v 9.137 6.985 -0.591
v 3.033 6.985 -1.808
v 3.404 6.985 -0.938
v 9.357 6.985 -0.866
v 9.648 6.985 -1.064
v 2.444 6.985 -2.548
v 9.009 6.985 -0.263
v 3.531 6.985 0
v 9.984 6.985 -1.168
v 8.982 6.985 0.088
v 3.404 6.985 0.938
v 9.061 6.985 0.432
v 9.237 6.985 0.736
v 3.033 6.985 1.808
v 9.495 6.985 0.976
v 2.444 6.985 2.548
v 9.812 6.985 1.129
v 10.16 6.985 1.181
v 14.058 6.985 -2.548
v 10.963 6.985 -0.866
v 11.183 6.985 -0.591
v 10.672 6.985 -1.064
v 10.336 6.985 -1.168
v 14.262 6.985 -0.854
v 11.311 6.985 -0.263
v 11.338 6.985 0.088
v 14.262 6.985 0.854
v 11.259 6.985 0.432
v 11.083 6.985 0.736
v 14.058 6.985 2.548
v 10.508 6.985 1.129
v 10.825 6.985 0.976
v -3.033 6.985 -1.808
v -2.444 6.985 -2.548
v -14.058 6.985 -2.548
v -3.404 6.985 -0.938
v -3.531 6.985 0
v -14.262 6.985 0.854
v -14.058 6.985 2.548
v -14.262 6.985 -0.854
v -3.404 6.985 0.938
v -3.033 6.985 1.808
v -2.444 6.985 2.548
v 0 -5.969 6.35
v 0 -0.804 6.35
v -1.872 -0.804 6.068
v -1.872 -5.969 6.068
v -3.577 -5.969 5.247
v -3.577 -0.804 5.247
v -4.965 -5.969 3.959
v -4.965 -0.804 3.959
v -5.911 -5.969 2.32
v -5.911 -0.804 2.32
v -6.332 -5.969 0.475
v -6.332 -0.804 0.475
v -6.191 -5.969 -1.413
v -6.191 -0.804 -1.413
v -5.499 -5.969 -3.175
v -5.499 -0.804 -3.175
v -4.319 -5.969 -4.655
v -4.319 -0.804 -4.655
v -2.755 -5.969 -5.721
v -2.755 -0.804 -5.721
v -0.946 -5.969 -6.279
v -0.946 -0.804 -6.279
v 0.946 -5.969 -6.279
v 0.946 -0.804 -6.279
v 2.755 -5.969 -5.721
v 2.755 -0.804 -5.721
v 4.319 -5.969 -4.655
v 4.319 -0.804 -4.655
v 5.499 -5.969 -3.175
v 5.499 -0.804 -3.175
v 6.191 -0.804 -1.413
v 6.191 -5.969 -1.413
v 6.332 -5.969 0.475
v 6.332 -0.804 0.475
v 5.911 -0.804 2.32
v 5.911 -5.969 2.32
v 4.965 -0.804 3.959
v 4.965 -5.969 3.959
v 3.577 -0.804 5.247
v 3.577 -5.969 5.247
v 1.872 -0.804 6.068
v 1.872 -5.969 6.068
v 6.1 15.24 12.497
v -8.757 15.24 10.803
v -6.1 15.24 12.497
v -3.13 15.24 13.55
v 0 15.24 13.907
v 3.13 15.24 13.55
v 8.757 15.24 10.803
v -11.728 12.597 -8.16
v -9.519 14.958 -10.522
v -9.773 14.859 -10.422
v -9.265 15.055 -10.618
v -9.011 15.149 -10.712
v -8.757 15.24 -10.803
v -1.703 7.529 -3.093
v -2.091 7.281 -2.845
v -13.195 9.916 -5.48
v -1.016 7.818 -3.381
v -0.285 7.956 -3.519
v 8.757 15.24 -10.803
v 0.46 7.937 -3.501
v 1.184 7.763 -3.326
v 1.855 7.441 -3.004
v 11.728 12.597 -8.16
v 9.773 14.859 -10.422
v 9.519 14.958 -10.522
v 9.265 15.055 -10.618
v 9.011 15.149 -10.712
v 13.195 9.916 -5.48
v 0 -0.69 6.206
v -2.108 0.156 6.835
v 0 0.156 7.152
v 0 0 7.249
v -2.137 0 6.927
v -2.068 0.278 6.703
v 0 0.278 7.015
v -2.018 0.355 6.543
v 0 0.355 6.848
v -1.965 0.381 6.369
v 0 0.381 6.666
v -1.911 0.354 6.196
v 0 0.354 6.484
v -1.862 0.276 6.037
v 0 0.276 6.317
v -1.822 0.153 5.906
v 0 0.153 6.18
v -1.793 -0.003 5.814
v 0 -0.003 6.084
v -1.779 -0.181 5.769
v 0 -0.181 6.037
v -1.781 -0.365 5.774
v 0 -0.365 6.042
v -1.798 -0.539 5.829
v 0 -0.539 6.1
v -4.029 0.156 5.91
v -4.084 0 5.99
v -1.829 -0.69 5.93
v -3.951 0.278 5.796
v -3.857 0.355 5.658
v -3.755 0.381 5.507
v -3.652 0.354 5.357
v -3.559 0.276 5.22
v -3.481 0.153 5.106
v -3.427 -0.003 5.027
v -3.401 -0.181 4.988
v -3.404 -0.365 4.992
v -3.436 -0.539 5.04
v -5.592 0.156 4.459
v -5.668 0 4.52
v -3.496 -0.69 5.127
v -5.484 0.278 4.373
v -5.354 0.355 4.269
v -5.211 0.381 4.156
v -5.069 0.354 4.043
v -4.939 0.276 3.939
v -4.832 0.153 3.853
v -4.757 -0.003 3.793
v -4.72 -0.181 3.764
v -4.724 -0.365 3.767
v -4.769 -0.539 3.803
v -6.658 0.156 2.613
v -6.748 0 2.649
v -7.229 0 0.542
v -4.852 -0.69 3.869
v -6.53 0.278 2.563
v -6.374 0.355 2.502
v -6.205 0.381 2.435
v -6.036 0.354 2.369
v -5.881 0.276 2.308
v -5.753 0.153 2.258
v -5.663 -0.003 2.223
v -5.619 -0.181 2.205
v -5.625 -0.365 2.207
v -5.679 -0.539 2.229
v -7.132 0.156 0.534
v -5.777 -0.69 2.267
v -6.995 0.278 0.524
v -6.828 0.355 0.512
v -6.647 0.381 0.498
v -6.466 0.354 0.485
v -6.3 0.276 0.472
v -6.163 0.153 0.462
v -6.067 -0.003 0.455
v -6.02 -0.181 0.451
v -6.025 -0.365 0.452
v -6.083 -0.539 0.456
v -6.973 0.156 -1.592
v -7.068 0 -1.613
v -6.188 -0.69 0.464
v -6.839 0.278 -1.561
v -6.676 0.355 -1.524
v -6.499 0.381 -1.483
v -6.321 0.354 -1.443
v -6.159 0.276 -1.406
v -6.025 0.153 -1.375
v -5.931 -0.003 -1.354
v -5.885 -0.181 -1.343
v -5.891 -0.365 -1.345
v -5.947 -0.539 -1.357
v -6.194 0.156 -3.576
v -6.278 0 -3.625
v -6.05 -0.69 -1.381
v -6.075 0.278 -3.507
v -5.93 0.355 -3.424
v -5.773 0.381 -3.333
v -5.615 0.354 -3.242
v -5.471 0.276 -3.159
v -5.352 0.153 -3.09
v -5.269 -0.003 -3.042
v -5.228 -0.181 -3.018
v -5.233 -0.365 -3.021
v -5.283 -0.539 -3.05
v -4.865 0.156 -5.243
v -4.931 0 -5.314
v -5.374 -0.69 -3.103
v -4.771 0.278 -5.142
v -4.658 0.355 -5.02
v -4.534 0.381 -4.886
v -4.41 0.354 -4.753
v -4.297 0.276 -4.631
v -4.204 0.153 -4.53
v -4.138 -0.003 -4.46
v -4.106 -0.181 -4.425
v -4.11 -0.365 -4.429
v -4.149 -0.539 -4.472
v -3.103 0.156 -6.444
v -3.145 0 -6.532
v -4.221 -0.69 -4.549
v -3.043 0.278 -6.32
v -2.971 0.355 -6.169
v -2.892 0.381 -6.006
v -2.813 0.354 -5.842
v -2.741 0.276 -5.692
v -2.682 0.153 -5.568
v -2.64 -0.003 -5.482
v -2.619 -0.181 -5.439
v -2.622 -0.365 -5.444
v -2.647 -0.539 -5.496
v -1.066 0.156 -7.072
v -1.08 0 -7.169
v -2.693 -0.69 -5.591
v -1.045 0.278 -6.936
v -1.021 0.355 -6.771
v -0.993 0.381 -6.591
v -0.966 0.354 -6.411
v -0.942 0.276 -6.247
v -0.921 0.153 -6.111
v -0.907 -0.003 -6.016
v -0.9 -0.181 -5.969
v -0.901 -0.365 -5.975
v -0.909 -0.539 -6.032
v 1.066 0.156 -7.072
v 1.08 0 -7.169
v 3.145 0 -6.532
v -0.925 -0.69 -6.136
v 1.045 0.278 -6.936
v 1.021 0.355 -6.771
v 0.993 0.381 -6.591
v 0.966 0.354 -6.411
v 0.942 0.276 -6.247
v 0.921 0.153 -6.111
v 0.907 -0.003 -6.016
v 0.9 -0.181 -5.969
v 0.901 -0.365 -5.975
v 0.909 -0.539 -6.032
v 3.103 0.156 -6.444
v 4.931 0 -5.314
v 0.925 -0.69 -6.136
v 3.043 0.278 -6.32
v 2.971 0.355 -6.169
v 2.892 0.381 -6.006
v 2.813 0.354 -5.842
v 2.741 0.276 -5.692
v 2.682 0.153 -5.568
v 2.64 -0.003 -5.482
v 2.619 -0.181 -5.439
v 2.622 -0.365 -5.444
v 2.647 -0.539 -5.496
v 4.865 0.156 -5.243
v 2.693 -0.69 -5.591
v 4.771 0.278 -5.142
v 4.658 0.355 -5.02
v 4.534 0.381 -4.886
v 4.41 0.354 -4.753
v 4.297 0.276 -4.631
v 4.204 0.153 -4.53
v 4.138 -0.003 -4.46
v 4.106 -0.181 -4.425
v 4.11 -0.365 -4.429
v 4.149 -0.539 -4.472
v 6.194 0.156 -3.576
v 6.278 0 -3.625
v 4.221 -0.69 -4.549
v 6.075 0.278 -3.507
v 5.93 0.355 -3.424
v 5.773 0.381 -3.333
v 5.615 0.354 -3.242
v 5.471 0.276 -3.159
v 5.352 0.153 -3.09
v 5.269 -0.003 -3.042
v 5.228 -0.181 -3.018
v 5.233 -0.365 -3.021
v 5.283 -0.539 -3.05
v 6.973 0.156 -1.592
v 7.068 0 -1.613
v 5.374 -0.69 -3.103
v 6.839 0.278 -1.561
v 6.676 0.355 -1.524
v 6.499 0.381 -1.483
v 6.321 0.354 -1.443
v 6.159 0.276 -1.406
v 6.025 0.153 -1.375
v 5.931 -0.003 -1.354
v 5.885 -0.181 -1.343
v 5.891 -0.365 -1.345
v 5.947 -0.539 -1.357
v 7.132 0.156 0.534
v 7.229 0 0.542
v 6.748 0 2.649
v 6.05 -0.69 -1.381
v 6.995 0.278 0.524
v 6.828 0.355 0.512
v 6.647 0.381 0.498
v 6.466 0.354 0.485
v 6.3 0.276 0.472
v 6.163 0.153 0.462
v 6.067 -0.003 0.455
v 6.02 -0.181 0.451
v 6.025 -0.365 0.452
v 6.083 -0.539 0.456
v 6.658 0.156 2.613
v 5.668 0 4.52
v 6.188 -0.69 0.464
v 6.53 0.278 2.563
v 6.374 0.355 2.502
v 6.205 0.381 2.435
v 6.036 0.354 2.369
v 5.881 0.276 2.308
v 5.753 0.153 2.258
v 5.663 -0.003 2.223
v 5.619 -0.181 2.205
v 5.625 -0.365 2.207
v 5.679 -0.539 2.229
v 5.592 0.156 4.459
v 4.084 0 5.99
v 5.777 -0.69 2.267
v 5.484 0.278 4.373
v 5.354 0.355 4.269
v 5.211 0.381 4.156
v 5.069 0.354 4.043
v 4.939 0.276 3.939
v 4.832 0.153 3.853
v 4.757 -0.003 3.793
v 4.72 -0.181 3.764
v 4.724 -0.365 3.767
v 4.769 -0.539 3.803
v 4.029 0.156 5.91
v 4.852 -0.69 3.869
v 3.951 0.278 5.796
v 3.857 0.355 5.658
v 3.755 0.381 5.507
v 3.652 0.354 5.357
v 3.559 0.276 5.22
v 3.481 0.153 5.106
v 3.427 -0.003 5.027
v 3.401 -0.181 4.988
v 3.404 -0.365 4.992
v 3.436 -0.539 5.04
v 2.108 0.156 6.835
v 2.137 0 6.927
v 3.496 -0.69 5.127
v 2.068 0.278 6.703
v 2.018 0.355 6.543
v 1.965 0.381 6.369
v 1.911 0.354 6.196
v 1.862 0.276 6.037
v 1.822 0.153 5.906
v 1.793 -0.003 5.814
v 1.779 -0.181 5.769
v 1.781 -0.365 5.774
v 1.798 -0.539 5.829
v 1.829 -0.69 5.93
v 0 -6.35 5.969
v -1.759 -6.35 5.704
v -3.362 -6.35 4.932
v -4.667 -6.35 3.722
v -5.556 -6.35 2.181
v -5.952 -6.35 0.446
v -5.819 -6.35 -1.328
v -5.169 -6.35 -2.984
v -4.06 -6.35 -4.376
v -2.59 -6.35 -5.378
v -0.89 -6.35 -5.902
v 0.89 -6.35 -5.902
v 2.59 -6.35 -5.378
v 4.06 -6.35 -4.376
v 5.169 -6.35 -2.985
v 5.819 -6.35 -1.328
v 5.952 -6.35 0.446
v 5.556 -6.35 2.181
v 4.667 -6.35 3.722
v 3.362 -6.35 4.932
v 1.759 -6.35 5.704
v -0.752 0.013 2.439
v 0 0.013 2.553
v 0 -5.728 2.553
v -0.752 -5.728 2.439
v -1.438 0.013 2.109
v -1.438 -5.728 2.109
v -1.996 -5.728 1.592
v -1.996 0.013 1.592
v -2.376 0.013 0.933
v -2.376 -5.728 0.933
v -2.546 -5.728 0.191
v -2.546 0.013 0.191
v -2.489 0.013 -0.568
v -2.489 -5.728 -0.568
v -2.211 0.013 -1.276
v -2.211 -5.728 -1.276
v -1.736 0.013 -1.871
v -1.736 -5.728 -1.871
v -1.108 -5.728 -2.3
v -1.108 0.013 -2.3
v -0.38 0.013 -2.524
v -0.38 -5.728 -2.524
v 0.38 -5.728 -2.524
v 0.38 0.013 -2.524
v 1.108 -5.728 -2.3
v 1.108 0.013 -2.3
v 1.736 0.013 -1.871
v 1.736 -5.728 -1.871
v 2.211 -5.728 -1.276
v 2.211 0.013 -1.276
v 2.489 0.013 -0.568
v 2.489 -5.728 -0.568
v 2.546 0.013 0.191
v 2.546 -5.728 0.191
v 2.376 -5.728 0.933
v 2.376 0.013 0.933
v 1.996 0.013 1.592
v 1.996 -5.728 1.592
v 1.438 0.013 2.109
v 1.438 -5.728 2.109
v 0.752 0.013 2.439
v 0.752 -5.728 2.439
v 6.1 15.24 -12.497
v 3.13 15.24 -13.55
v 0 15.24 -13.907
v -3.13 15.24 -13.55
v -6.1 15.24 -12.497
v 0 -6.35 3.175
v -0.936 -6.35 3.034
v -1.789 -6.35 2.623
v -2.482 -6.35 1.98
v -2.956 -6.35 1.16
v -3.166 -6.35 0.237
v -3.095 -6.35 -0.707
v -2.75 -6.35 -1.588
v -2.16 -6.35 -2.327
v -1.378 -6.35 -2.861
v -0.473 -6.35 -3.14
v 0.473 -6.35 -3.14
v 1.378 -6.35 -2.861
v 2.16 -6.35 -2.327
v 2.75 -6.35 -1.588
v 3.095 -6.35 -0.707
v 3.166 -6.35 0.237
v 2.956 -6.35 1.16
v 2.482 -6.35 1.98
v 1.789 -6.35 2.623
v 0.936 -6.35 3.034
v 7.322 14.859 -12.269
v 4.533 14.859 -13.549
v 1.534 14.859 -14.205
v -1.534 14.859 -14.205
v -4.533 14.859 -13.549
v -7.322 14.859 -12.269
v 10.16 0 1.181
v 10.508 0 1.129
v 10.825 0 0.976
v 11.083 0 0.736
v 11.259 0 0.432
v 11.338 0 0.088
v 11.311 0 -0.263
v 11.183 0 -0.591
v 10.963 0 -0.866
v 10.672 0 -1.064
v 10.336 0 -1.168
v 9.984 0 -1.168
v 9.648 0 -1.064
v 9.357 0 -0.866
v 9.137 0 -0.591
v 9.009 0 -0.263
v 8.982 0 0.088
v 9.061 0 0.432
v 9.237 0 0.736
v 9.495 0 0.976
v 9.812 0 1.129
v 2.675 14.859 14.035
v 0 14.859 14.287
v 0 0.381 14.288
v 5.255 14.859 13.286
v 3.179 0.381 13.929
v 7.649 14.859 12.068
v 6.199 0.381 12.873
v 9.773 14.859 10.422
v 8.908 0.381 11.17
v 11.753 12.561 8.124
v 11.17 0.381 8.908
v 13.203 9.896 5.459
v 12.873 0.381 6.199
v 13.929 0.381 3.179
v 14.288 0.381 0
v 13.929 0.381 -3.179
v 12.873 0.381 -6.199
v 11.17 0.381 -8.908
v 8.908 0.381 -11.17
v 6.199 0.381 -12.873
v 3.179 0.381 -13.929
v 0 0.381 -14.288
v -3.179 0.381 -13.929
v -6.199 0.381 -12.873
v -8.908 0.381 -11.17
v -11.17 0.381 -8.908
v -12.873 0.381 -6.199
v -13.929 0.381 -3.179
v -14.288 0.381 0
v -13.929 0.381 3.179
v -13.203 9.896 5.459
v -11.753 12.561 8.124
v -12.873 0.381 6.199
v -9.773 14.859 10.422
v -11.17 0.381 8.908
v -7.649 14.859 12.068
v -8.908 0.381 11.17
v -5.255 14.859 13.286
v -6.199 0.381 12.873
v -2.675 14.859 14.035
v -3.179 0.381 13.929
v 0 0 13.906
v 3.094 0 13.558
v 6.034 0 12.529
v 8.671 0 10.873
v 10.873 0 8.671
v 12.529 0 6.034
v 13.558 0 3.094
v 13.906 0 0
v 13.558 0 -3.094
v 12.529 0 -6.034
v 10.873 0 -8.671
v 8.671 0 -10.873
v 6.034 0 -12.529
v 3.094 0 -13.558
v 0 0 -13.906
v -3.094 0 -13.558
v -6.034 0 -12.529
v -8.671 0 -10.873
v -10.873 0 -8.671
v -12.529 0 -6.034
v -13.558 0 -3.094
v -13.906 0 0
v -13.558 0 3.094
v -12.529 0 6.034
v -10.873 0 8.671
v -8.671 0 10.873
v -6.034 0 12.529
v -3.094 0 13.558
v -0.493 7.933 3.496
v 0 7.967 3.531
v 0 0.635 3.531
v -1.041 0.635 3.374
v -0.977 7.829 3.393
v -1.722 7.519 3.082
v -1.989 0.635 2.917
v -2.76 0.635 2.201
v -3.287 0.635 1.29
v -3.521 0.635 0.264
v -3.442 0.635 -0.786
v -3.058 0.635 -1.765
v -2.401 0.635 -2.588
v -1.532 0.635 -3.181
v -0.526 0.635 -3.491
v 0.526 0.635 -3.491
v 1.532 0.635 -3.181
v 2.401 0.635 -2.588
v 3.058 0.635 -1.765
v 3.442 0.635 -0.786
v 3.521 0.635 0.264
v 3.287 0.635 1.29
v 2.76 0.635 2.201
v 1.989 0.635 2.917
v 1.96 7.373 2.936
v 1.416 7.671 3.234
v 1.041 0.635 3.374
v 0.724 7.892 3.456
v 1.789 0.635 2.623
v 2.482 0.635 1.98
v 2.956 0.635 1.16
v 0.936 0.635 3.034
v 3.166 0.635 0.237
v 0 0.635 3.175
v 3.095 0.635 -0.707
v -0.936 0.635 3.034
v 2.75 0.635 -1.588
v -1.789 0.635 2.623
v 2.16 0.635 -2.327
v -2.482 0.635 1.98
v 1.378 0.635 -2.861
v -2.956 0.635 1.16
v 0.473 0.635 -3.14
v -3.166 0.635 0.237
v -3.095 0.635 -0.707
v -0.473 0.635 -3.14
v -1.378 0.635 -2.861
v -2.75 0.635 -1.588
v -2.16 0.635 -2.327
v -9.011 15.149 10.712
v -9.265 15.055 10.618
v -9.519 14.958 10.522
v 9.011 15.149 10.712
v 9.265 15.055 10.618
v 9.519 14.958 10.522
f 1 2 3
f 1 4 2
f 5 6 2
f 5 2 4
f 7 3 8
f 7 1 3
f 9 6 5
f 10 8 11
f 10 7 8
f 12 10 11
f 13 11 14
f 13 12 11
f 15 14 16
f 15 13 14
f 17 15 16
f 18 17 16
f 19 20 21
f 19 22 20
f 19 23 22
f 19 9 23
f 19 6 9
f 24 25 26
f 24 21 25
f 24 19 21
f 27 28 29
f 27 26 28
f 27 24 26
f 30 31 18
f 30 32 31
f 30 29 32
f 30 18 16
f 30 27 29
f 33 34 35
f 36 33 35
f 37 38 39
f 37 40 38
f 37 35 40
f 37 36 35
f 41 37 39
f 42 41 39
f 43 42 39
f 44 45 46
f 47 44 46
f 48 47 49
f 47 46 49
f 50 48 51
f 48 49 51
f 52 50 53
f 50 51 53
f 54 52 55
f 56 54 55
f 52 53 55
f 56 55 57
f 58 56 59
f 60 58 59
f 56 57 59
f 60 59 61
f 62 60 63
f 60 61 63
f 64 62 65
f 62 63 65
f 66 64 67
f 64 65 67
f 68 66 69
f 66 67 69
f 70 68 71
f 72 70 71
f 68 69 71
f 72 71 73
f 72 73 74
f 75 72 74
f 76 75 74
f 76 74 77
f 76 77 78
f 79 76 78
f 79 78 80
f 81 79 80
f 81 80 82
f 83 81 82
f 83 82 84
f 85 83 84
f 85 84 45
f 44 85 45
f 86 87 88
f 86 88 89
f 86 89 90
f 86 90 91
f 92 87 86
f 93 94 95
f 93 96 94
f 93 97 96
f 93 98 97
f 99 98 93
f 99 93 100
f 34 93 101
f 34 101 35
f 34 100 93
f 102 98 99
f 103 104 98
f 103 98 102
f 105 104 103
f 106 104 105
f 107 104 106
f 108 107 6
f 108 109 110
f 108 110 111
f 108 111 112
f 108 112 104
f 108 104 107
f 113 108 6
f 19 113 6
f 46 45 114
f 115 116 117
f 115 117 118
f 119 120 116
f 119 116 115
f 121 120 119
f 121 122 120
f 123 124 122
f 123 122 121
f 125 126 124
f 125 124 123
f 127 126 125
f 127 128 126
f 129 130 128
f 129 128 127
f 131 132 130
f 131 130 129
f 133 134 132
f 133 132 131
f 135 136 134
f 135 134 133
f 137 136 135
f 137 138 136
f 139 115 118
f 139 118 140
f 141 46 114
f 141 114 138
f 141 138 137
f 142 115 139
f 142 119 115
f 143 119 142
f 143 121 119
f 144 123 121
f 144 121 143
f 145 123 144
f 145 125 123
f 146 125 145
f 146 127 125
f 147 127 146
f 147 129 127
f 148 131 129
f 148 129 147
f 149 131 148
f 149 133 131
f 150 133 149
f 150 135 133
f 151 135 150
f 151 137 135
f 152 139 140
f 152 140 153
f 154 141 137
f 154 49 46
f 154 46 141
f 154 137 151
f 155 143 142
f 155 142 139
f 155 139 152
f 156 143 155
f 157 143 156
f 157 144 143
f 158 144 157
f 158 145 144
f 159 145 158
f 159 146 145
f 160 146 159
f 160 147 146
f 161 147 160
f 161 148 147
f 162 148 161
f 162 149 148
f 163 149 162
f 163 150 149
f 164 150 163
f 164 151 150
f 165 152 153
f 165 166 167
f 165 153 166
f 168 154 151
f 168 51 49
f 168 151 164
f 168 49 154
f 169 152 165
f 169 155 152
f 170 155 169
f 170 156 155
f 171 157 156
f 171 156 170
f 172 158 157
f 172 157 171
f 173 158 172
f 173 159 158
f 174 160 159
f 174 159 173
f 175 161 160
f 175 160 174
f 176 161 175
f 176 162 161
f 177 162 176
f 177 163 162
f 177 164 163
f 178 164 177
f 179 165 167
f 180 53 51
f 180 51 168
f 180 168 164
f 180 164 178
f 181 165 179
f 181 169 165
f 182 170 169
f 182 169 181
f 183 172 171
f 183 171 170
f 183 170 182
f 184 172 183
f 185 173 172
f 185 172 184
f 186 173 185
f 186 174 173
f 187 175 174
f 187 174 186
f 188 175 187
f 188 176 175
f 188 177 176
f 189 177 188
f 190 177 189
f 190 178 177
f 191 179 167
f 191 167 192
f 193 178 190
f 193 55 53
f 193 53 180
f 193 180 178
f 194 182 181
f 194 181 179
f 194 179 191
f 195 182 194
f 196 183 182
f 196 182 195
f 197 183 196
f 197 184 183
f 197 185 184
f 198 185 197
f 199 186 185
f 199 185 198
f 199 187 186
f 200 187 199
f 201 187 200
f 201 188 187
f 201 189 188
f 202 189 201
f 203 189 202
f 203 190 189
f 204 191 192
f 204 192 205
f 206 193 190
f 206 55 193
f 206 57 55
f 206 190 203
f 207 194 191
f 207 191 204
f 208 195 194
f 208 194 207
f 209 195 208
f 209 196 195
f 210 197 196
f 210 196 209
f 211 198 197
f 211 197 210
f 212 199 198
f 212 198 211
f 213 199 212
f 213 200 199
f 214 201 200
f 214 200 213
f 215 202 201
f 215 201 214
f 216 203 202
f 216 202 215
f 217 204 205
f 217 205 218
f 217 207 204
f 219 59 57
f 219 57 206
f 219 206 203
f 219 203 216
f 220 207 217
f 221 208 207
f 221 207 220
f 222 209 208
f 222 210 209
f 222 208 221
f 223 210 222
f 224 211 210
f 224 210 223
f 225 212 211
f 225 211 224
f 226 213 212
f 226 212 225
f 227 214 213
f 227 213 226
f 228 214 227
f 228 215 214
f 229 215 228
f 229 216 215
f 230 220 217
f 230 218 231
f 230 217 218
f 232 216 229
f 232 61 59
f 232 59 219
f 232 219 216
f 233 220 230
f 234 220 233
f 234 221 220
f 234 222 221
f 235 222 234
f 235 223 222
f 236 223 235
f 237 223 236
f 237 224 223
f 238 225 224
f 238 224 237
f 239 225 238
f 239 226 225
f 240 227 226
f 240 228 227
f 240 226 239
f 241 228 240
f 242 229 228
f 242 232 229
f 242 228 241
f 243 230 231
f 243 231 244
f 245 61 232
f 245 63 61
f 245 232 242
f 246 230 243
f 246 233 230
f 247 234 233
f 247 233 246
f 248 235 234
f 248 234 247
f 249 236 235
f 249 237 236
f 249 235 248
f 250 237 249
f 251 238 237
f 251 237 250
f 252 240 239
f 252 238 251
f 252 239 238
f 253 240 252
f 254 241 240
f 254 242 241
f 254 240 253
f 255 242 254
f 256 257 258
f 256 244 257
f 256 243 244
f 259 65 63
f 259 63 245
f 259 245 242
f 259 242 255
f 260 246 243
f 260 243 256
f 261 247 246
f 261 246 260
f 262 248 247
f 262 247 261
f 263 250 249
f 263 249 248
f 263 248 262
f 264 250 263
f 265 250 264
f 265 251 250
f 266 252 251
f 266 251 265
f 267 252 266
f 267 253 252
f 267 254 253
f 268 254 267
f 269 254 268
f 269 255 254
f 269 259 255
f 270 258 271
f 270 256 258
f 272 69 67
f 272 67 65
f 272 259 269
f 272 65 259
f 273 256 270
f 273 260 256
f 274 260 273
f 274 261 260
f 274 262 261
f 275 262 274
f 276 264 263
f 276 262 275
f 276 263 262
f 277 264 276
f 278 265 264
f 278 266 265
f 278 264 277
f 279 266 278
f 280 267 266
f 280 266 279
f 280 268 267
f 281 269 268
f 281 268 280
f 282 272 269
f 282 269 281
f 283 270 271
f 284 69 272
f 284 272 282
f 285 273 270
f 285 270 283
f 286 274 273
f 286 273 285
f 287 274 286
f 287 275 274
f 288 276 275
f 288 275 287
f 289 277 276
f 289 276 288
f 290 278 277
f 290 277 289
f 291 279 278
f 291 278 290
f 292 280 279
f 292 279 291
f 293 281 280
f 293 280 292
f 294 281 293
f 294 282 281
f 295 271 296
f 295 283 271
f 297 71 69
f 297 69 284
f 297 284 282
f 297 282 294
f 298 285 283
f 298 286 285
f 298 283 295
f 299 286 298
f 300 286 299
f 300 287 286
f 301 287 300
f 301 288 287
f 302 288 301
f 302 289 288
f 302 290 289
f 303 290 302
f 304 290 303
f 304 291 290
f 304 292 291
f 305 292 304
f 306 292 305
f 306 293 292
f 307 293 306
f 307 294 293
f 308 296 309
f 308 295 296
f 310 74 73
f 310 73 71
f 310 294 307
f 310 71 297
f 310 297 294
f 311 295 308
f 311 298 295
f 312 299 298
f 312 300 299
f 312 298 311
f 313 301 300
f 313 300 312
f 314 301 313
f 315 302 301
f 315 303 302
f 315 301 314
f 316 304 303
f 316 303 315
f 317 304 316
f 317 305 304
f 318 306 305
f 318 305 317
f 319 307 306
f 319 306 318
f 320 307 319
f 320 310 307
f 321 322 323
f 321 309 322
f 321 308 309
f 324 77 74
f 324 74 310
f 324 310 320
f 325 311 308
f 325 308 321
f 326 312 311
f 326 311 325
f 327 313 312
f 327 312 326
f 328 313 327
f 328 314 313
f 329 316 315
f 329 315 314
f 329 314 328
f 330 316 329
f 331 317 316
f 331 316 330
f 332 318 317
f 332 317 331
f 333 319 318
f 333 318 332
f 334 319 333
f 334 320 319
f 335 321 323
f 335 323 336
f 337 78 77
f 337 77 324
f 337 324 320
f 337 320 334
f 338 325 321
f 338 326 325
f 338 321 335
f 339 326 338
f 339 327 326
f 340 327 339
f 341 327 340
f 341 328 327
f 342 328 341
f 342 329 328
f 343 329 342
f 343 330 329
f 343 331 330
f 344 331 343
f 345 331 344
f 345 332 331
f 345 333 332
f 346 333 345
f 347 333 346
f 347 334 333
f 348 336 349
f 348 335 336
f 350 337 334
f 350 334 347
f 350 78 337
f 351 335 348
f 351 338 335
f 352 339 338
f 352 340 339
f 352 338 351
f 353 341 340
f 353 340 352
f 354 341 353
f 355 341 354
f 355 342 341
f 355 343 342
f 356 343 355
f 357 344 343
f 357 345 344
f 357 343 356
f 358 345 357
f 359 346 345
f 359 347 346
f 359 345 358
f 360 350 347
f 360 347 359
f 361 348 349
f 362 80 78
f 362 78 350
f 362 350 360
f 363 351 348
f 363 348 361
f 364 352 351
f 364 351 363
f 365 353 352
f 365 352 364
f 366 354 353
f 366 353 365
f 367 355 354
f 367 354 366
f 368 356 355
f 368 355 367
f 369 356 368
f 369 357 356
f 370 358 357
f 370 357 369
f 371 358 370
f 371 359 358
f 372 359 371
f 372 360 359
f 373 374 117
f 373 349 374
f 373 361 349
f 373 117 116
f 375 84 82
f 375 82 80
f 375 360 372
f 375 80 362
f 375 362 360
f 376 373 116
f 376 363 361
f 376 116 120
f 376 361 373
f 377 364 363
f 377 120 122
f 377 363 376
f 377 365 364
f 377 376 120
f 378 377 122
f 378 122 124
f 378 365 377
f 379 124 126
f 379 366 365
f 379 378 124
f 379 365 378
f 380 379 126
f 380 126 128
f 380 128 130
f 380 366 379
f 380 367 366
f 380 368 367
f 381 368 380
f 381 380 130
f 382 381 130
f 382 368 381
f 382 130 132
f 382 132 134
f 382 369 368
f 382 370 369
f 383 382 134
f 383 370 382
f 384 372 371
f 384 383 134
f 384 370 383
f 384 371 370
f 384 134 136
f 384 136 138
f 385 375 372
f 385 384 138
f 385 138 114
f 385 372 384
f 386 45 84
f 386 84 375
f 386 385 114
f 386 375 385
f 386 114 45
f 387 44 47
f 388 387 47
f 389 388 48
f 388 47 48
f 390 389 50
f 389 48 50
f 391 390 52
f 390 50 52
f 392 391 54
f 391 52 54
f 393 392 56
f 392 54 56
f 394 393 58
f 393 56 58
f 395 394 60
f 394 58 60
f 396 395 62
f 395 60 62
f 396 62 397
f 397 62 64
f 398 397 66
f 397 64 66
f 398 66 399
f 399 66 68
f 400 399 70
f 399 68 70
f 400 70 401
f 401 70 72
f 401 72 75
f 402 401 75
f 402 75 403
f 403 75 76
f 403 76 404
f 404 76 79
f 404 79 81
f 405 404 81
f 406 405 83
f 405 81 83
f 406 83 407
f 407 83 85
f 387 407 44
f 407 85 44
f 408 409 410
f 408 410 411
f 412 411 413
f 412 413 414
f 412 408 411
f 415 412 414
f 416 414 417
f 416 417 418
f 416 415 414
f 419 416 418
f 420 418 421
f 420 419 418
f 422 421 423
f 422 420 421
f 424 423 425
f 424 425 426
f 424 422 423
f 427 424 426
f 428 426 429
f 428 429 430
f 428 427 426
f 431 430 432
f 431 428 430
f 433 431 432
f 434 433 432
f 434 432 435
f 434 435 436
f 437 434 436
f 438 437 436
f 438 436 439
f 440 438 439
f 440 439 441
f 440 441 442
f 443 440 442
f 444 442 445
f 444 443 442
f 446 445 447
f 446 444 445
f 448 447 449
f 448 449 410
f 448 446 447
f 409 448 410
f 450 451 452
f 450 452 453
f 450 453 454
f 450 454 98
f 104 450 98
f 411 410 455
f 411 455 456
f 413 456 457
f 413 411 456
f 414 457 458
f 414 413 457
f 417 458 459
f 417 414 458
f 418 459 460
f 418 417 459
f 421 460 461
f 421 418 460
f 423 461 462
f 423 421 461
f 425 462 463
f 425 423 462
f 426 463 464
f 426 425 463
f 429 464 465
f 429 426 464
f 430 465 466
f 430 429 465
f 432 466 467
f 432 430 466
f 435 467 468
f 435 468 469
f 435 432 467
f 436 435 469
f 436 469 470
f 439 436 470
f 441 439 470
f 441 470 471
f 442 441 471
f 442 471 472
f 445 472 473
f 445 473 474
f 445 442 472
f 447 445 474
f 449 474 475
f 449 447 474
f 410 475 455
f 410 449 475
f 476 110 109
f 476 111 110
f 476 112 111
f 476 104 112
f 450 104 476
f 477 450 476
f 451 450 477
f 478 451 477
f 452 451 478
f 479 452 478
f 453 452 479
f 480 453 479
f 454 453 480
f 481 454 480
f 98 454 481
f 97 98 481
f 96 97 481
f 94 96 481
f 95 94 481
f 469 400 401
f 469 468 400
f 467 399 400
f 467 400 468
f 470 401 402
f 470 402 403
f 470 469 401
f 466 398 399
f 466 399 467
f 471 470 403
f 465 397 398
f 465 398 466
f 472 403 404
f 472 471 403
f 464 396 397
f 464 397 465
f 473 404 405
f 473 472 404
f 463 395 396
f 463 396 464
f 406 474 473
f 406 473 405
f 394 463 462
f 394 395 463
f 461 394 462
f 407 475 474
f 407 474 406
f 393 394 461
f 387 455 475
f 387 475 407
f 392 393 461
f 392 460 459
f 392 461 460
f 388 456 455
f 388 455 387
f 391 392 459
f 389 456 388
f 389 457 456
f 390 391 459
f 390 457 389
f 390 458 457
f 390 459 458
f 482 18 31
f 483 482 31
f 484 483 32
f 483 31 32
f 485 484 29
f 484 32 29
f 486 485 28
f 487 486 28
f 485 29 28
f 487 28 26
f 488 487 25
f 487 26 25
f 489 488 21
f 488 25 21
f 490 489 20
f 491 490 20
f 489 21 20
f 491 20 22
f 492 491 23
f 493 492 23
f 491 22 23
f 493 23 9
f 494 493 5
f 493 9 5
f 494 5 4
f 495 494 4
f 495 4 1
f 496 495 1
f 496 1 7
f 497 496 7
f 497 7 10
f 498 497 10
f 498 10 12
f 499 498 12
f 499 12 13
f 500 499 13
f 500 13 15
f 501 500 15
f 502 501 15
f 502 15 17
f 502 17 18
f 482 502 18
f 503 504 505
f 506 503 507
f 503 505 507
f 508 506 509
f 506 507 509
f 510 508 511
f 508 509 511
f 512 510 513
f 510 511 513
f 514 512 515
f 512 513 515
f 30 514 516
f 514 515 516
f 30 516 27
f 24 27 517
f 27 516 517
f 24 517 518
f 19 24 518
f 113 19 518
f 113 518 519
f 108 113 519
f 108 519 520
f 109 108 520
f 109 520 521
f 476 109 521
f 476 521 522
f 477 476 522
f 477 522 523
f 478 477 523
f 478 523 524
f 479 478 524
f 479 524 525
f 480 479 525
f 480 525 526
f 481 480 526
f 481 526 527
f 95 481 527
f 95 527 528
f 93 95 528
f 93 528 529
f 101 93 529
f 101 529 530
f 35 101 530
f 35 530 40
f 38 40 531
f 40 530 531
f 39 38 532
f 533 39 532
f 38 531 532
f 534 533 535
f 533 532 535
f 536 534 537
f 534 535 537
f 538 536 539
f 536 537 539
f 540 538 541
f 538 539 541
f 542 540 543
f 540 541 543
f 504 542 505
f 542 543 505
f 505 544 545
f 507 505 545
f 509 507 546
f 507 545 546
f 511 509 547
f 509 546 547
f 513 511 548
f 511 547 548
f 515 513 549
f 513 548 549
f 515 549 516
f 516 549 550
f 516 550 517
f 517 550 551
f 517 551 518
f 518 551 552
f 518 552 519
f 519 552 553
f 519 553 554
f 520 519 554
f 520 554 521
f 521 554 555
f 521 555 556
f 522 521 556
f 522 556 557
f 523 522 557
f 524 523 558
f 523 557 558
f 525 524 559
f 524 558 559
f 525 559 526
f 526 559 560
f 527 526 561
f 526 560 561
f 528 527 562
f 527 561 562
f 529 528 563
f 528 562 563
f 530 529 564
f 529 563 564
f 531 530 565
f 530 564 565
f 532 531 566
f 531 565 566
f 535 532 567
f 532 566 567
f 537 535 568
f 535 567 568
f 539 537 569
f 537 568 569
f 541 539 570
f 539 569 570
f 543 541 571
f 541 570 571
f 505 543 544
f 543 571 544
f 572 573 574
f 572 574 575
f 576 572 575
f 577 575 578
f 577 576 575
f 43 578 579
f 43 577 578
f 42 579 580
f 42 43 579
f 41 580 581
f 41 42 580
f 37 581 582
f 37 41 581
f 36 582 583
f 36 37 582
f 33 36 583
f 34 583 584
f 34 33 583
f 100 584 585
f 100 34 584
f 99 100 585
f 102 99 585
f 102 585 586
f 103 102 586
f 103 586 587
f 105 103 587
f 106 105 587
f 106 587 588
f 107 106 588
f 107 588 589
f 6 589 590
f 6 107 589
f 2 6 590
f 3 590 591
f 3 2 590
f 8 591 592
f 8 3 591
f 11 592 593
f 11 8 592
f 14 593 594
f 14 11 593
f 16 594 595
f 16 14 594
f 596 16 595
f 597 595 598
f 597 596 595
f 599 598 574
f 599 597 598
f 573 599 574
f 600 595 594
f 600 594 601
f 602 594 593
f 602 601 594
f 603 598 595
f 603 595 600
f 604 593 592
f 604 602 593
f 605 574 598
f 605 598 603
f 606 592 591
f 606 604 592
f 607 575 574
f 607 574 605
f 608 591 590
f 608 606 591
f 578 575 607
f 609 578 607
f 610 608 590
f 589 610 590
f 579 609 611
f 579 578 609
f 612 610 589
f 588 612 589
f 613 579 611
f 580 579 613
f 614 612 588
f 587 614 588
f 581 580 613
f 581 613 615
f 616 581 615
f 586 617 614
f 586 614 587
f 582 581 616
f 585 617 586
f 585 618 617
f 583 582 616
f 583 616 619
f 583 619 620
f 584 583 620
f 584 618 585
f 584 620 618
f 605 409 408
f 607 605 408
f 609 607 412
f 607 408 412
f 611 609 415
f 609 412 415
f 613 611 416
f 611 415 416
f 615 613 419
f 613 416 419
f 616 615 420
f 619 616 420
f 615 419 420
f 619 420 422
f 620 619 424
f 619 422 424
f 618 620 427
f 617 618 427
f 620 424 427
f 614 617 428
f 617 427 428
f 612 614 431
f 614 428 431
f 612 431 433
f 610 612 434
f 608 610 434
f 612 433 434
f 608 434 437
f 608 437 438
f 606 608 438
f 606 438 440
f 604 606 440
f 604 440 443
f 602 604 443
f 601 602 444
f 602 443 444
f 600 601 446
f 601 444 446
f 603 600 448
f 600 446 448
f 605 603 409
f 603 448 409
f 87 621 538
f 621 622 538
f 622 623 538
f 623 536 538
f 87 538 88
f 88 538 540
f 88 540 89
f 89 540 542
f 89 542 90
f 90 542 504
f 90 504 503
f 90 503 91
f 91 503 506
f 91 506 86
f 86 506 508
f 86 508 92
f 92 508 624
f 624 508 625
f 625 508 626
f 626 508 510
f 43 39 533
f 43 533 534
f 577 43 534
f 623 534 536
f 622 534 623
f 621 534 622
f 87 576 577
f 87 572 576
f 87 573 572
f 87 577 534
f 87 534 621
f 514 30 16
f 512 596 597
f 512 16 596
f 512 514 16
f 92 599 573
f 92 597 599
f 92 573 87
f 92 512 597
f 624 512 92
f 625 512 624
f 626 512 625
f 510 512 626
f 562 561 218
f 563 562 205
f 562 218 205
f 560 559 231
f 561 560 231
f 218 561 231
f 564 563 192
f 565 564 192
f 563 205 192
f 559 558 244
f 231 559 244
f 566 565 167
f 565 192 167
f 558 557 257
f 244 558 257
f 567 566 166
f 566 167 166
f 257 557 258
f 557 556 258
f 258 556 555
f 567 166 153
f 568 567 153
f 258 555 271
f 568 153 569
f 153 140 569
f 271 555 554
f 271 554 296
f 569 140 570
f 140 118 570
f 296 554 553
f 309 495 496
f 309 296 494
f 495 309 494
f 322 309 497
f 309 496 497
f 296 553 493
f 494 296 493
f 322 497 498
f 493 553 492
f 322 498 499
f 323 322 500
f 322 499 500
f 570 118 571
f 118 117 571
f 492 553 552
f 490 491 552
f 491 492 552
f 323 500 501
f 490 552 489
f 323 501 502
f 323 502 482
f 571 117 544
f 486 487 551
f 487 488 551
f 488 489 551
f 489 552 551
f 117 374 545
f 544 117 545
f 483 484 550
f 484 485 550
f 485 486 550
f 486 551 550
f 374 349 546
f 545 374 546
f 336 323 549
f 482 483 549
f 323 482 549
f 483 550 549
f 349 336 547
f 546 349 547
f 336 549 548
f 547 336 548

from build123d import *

# Parameters (mm, degrees)
SKETCH1_R               = 14.2875
EXTRUDE1_DEPTH          = 15.24
CUT_EXTRUDE1_DEPTH      = 15.2875
CUT_EXTRUDE1_DEPTH_BACK = 15.2875
SKETCH6_R               = 6.35
EXTRUDE2_DEPTH          = 6.35
CHAMFER1_SIZE           = 0.6223
CHAMFER2_SIZE           = 0.381
SKETCH8_R               = 0.635
SKETCH9_R               = 1.1811
CUT_EXTRUDE2_DEPTH      = 14.335


with BuildPart() as part:
    # Sketch1 → Extrude1 (new body)
    with BuildSketch(Plane(origin=(0, 0, 0), x_dir=(1, 0, 0), z_dir=(0, 1, 0))):
        with Locations(Location((0, 0, 0), (0, 0, 270))):  # turned: the seam where the file's is
            Circle(SKETCH1_R)
    extrude(amount=EXTRUDE1_DEPTH)

    # Sketch3 → Cut-Extrude1 (cut, two sides)
    with BuildSketch(Plane(origin=(0, 0, 0), x_dir=(0, 0, -1), z_dir=(1, 0, 0))) as cut_extrude1_sk:
        Polygon((-10.803384182, 15.24), (10.803384182, 15.24), (2.548384182, 6.985), (-2.548384182, 6.985), align=None)
    extrude(amount=CUT_EXTRUDE1_DEPTH, mode=Mode.SUBTRACT)
    extrude(cut_extrude1_sk.sketch, amount=-CUT_EXTRUDE1_DEPTH_BACK, mode=Mode.SUBTRACT)

    # Sketch6 → Extrude2 (add)
    with BuildSketch(Plane.XZ):
        with Locations(Location((0, 0, 0), (0, 0, 90))):  # turned: the seam where the file's is
            Circle(SKETCH6_R)
    extrude(amount=EXTRUDE2_DEPTH)

    # Sketch7 → Cut-Revolve1 (revolve, cut)
    with BuildSketch(Plane.XY, mode=Mode.PRIVATE) as cut_revolve1_sk:
        Polygon((0, -6.35), (2.5527, -6.35), (2.5527, 0.635), (3.5306, 0.635), (3.5306, 6.985), (3.5306, 15.24), (0, 15.24), (0, 6.985), align=None)
    revolve(cut_revolve1_sk.sketch.rotate(Axis((0, 13.979393491, 0), (0, -1, 0)), 90), axis=Axis((0, 13.979393491, 0), (0, -1, 0)), mode=Mode.SUBTRACT)  # turned: the seam where the file's is

    # Chamfer1
    chamfer1_edges = [part.edges().sort_by_distance(p)[0] for p in [
        (0, -6.35, -2.5527),
        (0, 0.635, -2.5527),
    ]]
    chamfer(chamfer1_edges, length=CHAMFER1_SIZE)

    # Chamfer2
    chamfer2_edges = [part.edges().sort_by_distance(p)[0] for p in [
        (0, 15.24, -14.2875),
        (-4.988953034, 15.24, 13.388166561),
        (0, 0, -14.2875),
        (0, -6.35, -6.35),
    ]]
    chamfer(chamfer2_edges, length=CHAMFER2_SIZE)

    # Sketch8 → Cut-Revolve2 (revolve, cut)
    with BuildSketch(Plane.XY, mode=Mode.PRIVATE) as cut_revolve2_sk:
        with Locations((6.6675, -0.254)):
            Circle(SKETCH8_R)
    revolve(cut_revolve2_sk.sketch.rotate(Axis((0, 0, 0), (0, -1, 0)), 90), axis=Axis((0, 0, 0), (0, -1, 0)), mode=Mode.SUBTRACT)  # turned: the seam where the file's is

    # Sketch9 → Cut-Extrude2 (cut, through all)
    with BuildSketch(Plane(origin=(0, 6.985, 0), x_dir=(-1, 0, 0), z_dir=(0, 1, 0))):
        with Locations(Location((-10.16, 0, 0), (0, 0, 90))):  # turned: the seam where the file's is
            Circle(SKETCH9_R)
    extrude(amount=-CUT_EXTRUDE2_DEPTH, mode=Mode.SUBTRACT)


solid = part.part
